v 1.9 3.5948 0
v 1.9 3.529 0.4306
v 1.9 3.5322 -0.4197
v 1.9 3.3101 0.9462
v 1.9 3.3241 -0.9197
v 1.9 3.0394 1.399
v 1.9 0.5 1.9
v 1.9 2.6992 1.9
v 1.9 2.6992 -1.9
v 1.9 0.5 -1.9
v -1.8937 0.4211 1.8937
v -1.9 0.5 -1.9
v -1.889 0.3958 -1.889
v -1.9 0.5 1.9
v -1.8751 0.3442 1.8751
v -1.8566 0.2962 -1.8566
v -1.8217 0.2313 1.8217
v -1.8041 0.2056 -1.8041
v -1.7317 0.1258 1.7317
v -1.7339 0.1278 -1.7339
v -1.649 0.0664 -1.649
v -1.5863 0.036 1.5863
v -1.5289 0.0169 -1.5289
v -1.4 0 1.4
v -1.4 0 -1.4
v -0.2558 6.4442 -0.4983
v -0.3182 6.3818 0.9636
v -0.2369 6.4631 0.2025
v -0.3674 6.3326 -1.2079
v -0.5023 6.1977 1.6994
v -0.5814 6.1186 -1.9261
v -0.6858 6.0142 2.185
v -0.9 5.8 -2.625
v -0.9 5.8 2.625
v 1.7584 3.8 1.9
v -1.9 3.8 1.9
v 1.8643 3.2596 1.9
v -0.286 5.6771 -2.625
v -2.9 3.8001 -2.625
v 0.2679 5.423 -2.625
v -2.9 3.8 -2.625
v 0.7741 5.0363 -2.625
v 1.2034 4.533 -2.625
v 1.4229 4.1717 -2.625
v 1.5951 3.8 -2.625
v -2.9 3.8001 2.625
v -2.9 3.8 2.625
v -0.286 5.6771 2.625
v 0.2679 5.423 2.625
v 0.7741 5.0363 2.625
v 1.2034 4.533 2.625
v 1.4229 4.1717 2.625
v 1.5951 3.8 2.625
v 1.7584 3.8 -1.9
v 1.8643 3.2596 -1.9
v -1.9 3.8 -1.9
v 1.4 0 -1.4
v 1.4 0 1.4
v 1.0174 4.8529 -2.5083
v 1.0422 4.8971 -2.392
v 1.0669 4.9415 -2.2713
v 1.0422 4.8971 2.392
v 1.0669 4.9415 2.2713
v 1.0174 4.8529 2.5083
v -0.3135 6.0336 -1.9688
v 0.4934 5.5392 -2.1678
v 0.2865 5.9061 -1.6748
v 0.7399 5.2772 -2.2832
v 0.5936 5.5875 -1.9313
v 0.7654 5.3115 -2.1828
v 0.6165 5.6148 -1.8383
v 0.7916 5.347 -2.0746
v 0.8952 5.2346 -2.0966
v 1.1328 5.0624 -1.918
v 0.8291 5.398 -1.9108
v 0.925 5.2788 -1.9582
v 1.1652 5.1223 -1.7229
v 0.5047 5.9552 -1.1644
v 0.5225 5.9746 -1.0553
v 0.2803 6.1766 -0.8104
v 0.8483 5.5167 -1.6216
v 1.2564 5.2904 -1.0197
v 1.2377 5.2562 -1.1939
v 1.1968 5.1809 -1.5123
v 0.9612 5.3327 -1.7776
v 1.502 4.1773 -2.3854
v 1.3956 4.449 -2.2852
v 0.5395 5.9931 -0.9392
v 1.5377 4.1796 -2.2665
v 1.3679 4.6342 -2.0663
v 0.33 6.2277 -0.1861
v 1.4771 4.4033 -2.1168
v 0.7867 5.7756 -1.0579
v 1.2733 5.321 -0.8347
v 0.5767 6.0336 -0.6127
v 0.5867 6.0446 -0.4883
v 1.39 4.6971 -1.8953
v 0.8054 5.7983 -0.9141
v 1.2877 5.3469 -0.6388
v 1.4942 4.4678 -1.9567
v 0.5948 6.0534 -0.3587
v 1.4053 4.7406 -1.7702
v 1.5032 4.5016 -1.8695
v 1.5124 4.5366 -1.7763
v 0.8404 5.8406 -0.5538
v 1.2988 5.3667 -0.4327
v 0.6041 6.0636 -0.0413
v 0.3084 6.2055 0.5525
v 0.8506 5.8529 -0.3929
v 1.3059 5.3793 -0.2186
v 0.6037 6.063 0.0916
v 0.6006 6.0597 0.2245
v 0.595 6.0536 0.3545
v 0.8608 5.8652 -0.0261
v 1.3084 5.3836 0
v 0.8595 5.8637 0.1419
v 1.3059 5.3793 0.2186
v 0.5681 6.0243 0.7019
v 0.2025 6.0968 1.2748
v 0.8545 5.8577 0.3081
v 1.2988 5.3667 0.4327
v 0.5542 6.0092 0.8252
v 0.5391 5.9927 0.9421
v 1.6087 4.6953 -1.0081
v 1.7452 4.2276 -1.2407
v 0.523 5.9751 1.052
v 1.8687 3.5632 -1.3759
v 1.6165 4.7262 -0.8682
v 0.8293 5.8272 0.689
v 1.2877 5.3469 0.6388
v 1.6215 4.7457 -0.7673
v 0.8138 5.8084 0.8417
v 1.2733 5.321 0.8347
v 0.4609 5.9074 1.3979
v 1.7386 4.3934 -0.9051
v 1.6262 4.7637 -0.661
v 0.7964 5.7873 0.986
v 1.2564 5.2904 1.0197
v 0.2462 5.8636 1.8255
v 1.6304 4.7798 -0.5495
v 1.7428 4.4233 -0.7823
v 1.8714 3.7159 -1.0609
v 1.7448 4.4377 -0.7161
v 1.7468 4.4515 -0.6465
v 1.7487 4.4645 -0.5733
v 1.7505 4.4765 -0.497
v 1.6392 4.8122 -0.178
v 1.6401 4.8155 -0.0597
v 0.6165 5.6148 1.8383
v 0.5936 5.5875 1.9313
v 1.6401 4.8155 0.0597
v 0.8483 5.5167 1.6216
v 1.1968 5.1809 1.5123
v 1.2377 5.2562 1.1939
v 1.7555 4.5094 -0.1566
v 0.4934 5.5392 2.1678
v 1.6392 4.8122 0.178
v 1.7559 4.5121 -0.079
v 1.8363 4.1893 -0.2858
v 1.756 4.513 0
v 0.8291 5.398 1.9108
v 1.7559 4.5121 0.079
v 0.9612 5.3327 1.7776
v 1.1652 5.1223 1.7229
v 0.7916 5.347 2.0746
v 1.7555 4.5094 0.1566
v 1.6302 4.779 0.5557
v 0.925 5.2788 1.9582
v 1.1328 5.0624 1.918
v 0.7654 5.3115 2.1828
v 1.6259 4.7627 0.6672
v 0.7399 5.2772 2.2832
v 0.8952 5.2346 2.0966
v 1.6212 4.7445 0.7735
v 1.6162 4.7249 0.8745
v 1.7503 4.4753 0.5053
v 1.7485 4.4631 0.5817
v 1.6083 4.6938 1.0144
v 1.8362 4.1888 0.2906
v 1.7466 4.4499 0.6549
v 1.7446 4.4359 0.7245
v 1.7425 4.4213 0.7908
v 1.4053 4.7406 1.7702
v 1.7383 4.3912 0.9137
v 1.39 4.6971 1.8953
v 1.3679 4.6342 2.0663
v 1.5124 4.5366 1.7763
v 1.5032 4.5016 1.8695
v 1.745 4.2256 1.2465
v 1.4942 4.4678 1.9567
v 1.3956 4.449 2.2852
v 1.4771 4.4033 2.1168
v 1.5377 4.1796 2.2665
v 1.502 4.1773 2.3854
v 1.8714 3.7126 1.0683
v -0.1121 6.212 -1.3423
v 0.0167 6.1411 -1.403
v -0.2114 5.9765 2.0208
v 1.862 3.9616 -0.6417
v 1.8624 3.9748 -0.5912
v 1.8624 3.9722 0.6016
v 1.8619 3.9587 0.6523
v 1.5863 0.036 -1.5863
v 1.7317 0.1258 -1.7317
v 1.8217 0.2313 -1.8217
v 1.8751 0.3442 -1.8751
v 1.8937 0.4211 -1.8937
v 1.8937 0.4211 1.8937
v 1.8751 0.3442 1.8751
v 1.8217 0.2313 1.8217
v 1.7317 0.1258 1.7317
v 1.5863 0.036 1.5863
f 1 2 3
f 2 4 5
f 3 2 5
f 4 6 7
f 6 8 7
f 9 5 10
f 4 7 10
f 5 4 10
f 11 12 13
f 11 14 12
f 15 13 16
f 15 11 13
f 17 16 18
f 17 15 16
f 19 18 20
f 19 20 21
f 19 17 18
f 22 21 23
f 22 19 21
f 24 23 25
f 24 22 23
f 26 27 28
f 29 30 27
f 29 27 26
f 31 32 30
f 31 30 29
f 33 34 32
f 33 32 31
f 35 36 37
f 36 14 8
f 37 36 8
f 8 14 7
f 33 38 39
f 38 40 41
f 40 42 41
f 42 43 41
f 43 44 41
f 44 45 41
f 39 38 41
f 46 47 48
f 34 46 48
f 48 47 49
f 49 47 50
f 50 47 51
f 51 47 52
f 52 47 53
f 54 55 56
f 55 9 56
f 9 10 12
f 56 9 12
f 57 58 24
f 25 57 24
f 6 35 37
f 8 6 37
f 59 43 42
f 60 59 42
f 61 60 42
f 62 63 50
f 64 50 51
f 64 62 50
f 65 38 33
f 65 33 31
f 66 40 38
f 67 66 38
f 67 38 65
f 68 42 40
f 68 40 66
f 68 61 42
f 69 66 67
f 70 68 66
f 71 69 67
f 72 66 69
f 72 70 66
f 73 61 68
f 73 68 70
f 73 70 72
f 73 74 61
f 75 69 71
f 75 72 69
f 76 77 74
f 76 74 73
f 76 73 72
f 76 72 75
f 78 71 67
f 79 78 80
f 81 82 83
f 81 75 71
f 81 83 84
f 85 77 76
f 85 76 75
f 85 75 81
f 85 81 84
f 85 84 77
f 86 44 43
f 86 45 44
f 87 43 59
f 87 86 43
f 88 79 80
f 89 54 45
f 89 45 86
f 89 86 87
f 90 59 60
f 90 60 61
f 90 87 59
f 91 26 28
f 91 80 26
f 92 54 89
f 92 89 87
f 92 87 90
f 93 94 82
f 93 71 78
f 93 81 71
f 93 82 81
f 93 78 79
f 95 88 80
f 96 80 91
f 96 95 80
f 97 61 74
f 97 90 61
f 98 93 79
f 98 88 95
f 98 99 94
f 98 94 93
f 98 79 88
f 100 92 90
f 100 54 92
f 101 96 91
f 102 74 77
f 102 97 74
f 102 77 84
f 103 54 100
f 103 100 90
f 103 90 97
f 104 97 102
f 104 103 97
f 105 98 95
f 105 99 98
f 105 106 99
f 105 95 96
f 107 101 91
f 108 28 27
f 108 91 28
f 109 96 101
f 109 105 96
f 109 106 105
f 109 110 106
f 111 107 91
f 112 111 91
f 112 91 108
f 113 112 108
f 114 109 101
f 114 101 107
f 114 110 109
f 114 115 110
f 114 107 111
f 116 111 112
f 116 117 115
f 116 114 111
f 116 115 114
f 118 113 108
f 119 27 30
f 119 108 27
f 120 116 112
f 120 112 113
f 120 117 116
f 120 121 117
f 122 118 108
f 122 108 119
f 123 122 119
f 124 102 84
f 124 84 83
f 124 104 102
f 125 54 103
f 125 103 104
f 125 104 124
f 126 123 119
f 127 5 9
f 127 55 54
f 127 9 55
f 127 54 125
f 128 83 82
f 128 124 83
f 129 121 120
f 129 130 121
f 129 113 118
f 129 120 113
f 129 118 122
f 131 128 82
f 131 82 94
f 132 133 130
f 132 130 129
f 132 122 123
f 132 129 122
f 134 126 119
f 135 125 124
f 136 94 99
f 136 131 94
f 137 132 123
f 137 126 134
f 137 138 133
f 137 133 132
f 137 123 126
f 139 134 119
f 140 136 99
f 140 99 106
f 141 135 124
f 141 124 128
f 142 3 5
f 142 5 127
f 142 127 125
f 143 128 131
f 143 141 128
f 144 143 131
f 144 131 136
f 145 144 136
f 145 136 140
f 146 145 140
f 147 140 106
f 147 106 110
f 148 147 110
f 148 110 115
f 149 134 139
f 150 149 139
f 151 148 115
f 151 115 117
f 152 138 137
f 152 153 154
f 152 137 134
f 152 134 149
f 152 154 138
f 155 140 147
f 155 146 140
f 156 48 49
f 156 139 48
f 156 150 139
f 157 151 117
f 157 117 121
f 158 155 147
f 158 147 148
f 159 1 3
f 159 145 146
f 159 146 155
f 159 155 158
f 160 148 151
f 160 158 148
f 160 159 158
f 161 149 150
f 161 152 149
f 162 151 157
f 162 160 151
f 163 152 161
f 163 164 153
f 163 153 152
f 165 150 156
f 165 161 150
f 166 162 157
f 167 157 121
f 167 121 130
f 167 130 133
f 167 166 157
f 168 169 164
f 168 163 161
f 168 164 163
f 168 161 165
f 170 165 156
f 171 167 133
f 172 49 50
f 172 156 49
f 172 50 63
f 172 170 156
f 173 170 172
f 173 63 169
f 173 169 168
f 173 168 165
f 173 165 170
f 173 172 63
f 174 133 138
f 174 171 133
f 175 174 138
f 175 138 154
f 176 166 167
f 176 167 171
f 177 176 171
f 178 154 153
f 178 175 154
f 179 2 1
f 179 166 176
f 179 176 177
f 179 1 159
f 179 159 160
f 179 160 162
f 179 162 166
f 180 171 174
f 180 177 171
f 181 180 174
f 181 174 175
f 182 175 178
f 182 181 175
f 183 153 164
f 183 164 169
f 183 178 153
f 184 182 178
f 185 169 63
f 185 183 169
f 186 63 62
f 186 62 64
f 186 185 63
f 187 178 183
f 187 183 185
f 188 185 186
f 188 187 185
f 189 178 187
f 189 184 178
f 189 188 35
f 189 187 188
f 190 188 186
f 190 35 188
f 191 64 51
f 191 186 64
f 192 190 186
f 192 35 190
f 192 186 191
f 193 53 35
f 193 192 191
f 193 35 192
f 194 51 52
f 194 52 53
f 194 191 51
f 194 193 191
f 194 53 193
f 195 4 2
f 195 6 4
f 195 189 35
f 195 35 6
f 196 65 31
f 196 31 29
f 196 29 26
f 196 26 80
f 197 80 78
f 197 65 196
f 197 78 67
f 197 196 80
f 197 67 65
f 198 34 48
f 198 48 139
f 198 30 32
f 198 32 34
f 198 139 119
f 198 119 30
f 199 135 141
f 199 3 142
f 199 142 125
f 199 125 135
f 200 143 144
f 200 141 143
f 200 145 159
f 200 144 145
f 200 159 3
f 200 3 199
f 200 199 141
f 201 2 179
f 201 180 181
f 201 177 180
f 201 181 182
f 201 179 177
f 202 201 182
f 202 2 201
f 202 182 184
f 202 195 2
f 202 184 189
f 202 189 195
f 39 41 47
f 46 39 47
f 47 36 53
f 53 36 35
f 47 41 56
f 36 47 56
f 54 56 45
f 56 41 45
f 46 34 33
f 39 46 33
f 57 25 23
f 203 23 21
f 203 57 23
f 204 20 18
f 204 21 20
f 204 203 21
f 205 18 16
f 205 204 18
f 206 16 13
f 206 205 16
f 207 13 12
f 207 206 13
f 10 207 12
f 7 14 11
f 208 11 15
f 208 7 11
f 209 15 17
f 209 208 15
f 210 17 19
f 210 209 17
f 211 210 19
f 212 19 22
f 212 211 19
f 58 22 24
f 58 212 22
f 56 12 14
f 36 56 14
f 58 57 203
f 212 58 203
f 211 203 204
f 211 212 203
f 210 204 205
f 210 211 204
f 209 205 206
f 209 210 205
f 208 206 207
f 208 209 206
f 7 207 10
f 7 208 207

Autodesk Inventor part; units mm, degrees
ref_plane "YZ Plane" through (0, 0, 0) normal (1, 0, 0) x (0, 1, 0)
ref_plane "XZ Plane" through (0, 0, 0) normal (0, 1, 0) x (-1, 0, 0)
ref_plane "XY Plane" through (0, 0, 0) normal (0, 0, 1) x (1, 0, 0)
sketch "Эскиз1" plane through (0, 0, 0) normal (0, 1, 0) x (-1, 0, 0)
  line L0 (1.9, 1.9) -> (-1.9, 1.9)
  line L1 (-1.9, 1.9) -> (-1.9, -1.9)
  line L2 (-1.9, -1.9) -> (1.9, -1.9)
  line L3 (1.9, -1.9) -> (1.9, 1.9)
  line L4 (2.66, 0) -> (-2.66, 0) projected
  line L5 (0, -2.66) -> (0, 2.66) projected
  point P0 (0, 0)
  dimension "d0" = 3.8
extrude "Выдавливание1" add sketch "Эскиз1" along normal blind 3.8
sketch "Эскиз2" plane through (0, 3.8, 0) normal (0, 1, 0) x (1, 0, 0)
  line L0 (-2.9, -2.625) -> (1.9, -2.625)
  line L1 (1.9, -2.625) -> (1.9, 2.625)
  line L2 (1.9, 2.625) -> (-2.9, 2.625)
  line L3 (-2.9, 2.625) -> (-2.9, -2.625)
  line L4 (1.9, -1.9) -> (1.9, 1.9) projected
  line L5 (-3.86, 0) -> (2.86, 0) projected
  point P0 (0, 0)
  dimension "d3" = 5.25
  dimension "d4" = 4.8
extrude "Выдавливание2" add sketch "Эскиз2" along normal blind 2
sketch "Эскиз5" plane through (1.9, 0, 1.9) normal (1, 0, 0) x (0, 0, -1)
  line L0 (4.525, 3.8) -> (4.525, 5.8) projected
  line L1 (-0.725, 5.8) -> (4.525, 5.8) projected
  line L2 (4.525, 5.8) -> (-0.725, 5.8)
  line L3 (-0.725, 3.8) -> (-0.725, 5.8) projected
  arc A0 (4.525, 5.8) -> (-0.725, 5.8) centre (1.9, 0.9668) ccw
  point P0 (1.9, 0)
  dimension "d10" = 5.5
chamfer "Фаска1" distance 2 angle 45 1 edges at (-2.9, 5.8, 0)
extrude "Выдавливание3" add sketch "Эскиз5" against normal up to surface surface through (-1.9, 4.8, -1.3125) normal (-0.7071068, 0.7071068, 0)
fillet "Сопряжение1" radius 3 1 edges at (1.9, 6.4668, 0)
fillet "Сопряжение2" radius 0.5 4 edges at (1.9, 0, 0) (0, 0, 1.9) (0, 0, -1.9) (-1.9, 0, 0)
properties part number "BUTTON_OUTSIDE"
